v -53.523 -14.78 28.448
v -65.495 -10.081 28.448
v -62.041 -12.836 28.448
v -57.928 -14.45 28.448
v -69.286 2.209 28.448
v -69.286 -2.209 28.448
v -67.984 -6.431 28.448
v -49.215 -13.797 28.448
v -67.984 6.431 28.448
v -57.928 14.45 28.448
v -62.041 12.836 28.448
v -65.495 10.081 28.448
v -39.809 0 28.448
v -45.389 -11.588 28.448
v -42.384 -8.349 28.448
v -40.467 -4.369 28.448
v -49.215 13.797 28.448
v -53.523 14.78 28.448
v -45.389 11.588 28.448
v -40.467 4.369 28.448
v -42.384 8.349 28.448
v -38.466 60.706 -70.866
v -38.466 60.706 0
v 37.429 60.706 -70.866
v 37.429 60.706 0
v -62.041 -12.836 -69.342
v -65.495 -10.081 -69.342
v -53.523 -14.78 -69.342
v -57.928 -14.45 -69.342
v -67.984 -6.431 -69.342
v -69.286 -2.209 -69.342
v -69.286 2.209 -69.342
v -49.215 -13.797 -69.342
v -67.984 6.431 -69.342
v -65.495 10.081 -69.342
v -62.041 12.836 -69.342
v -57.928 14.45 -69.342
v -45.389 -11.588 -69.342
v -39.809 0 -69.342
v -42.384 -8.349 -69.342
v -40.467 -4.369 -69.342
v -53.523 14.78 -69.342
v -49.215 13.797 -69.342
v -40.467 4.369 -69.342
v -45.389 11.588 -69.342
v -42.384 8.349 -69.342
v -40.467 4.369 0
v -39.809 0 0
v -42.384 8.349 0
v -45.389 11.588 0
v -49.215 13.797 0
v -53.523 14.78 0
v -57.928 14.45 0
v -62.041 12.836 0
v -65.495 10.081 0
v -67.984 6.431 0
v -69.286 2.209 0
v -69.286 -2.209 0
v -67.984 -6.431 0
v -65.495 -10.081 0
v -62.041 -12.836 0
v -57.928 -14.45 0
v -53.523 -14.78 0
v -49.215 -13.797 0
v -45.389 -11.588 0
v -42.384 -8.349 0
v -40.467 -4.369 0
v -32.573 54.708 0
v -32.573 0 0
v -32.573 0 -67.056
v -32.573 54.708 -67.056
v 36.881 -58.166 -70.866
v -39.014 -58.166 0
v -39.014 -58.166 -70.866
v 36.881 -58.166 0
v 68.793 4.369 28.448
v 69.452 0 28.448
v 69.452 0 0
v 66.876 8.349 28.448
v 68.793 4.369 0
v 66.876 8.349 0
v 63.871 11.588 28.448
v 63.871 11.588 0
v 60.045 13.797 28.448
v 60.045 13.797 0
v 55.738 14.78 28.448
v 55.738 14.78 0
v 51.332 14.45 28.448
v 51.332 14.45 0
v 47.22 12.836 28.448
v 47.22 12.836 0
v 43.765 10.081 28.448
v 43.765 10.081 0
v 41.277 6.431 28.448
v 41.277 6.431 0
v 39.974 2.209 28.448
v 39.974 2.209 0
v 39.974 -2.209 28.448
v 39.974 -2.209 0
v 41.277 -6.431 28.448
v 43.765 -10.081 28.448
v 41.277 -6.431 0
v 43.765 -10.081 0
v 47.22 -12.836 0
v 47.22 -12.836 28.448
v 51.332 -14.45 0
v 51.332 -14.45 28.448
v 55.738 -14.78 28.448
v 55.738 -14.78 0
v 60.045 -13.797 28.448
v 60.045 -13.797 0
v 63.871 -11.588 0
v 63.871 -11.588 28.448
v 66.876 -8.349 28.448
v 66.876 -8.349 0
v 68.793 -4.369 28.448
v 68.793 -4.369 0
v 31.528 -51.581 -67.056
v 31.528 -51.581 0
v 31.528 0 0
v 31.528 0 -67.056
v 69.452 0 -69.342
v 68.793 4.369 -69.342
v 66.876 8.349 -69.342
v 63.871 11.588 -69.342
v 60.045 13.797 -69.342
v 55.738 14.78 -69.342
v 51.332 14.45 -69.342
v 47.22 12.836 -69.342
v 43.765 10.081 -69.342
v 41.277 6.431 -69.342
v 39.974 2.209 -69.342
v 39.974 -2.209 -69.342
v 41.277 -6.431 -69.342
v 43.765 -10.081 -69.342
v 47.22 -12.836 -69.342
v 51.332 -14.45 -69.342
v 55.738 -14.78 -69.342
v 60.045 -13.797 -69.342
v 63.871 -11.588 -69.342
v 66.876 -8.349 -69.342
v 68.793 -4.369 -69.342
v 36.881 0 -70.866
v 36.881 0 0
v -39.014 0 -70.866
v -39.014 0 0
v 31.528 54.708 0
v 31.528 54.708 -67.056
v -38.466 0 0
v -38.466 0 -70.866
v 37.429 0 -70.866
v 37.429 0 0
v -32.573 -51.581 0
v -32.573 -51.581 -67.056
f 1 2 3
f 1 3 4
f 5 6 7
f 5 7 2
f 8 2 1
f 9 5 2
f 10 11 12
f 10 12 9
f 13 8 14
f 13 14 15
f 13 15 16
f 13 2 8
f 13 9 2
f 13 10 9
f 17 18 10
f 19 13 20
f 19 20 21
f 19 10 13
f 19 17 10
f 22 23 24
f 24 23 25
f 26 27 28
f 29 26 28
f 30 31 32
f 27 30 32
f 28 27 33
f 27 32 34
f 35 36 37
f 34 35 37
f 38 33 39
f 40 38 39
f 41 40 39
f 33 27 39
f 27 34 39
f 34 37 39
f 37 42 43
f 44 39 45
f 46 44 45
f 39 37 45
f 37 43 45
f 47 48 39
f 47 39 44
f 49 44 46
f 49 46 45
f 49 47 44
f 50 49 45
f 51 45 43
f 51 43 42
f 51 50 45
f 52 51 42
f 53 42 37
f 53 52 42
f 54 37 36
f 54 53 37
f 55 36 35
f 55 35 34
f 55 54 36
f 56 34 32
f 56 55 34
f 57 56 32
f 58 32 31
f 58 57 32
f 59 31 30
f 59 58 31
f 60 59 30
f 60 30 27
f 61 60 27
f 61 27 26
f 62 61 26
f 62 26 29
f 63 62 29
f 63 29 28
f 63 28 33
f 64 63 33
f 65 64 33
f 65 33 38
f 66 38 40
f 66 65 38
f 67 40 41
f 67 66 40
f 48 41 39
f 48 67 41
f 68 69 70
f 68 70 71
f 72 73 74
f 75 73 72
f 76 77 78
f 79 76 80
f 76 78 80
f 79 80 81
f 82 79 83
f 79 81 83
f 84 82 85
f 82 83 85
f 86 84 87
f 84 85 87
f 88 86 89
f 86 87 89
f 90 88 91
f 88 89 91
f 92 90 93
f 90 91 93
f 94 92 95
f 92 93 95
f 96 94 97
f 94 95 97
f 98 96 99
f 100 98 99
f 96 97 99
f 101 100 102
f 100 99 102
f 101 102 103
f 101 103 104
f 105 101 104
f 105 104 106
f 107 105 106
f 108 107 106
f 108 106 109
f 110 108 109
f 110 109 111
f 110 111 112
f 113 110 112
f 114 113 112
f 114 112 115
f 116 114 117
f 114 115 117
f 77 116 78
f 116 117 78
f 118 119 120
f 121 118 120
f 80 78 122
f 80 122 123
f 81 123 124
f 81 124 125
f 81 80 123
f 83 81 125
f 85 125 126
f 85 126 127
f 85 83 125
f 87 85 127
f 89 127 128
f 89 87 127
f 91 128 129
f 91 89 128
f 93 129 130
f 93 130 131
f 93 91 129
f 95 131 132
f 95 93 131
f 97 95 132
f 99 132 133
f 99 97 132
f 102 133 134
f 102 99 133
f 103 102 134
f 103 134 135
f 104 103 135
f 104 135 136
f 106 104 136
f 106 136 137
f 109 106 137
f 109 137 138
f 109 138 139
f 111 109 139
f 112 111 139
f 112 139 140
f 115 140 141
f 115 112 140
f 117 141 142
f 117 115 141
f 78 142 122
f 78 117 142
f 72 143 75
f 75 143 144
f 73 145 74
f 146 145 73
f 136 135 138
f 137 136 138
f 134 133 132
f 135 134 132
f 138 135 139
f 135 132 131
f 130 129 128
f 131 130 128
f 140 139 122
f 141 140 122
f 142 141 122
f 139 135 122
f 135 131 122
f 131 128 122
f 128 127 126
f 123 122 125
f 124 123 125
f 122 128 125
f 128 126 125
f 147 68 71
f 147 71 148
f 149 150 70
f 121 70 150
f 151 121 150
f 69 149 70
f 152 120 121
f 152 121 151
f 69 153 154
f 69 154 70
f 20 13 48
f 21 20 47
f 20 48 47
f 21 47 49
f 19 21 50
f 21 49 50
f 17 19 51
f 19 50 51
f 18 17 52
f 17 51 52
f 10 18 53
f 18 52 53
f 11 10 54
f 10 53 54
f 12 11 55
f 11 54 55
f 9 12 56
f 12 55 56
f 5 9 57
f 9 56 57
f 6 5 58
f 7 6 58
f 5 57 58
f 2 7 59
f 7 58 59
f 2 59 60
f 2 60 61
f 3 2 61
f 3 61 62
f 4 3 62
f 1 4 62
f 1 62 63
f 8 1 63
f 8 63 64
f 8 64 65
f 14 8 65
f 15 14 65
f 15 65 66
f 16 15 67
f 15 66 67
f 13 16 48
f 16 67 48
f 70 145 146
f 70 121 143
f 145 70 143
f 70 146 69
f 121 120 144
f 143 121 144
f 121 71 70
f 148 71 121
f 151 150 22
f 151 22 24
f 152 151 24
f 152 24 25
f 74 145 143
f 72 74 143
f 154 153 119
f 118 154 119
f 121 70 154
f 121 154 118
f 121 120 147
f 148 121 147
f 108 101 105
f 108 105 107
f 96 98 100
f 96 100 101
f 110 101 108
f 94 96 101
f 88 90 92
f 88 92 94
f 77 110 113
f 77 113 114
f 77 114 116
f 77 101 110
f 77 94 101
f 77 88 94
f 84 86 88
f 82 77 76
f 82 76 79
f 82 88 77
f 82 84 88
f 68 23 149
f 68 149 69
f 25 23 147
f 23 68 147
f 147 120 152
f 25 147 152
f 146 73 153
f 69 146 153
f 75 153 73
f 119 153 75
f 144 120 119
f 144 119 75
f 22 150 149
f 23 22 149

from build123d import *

# Parameters (mm, degrees)
F1_R     = 14.821392
F2_DEPTH = 69.342
F0_W     = 75.895201
F0_H     = 70.866004
F3_DEPTH = 58.166
F4_W     = 75.8952
F4_H     = 70.866
F5_DEPTH = 60.706
F6_W     = 64.100887
F6_H     = 106.28945
F7_DEPTH = 67.056
F8_DEPTH = 28.448


with BuildPart() as f2:
    # F1 (on Top) → F2 (new body)
    with BuildSketch(Plane.XY):
        with Locations((-54.630253, 0)):
            Circle(F1_R)
        with Locations((54.630253, 0)):
            Circle(F1_R)
    extrude(amount=-F2_DEPTH)

    # F1 (on Top) → F8 (join)
    with BuildSketch(Plane.XY):
        with Locations((-54.630253, 0)):
            Circle(F1_R)
        with Locations((54.630253, 0)):
            Circle(F1_R)
    extrude(amount=F8_DEPTH)


with BuildPart() as f3:
    # F0 (on Front) → F3 (new body)
    with BuildSketch(Plane.XZ):
        with Locations((-1.066799, -35.433002)):
            Rectangle(F0_W, F0_H)
    extrude(amount=F3_DEPTH)


with BuildPart() as f5:
    # F4 (on Front) → F5 (new body)
    with BuildSketch(Plane.XZ):
        with Locations((-0.518296, -35.433)):
            Rectangle(F4_W, F4_H)
    extrude(amount=-F5_DEPTH)


with BuildPart() as f7_tool:
    # F6 (on Top) → F7 (new body)
    with BuildSketch(Plane.XY):
        with Locations((-0.522559, 1.563625)):
            Rectangle(F6_W, F6_H)
    extrude(amount=-F7_DEPTH)


with BuildPart() as f3_1:
    add(f3.part)

    # F7: cut by f7_tool
    add(f7_tool.part, mode=Mode.SUBTRACT)


with BuildPart() as f5_1:
    add(f5.part)

    # F7: cut by f7_tool
    add(f7_tool.part, mode=Mode.SUBTRACT)


solid = Compound([f2.part, f3_1.part, f5_1.part])
